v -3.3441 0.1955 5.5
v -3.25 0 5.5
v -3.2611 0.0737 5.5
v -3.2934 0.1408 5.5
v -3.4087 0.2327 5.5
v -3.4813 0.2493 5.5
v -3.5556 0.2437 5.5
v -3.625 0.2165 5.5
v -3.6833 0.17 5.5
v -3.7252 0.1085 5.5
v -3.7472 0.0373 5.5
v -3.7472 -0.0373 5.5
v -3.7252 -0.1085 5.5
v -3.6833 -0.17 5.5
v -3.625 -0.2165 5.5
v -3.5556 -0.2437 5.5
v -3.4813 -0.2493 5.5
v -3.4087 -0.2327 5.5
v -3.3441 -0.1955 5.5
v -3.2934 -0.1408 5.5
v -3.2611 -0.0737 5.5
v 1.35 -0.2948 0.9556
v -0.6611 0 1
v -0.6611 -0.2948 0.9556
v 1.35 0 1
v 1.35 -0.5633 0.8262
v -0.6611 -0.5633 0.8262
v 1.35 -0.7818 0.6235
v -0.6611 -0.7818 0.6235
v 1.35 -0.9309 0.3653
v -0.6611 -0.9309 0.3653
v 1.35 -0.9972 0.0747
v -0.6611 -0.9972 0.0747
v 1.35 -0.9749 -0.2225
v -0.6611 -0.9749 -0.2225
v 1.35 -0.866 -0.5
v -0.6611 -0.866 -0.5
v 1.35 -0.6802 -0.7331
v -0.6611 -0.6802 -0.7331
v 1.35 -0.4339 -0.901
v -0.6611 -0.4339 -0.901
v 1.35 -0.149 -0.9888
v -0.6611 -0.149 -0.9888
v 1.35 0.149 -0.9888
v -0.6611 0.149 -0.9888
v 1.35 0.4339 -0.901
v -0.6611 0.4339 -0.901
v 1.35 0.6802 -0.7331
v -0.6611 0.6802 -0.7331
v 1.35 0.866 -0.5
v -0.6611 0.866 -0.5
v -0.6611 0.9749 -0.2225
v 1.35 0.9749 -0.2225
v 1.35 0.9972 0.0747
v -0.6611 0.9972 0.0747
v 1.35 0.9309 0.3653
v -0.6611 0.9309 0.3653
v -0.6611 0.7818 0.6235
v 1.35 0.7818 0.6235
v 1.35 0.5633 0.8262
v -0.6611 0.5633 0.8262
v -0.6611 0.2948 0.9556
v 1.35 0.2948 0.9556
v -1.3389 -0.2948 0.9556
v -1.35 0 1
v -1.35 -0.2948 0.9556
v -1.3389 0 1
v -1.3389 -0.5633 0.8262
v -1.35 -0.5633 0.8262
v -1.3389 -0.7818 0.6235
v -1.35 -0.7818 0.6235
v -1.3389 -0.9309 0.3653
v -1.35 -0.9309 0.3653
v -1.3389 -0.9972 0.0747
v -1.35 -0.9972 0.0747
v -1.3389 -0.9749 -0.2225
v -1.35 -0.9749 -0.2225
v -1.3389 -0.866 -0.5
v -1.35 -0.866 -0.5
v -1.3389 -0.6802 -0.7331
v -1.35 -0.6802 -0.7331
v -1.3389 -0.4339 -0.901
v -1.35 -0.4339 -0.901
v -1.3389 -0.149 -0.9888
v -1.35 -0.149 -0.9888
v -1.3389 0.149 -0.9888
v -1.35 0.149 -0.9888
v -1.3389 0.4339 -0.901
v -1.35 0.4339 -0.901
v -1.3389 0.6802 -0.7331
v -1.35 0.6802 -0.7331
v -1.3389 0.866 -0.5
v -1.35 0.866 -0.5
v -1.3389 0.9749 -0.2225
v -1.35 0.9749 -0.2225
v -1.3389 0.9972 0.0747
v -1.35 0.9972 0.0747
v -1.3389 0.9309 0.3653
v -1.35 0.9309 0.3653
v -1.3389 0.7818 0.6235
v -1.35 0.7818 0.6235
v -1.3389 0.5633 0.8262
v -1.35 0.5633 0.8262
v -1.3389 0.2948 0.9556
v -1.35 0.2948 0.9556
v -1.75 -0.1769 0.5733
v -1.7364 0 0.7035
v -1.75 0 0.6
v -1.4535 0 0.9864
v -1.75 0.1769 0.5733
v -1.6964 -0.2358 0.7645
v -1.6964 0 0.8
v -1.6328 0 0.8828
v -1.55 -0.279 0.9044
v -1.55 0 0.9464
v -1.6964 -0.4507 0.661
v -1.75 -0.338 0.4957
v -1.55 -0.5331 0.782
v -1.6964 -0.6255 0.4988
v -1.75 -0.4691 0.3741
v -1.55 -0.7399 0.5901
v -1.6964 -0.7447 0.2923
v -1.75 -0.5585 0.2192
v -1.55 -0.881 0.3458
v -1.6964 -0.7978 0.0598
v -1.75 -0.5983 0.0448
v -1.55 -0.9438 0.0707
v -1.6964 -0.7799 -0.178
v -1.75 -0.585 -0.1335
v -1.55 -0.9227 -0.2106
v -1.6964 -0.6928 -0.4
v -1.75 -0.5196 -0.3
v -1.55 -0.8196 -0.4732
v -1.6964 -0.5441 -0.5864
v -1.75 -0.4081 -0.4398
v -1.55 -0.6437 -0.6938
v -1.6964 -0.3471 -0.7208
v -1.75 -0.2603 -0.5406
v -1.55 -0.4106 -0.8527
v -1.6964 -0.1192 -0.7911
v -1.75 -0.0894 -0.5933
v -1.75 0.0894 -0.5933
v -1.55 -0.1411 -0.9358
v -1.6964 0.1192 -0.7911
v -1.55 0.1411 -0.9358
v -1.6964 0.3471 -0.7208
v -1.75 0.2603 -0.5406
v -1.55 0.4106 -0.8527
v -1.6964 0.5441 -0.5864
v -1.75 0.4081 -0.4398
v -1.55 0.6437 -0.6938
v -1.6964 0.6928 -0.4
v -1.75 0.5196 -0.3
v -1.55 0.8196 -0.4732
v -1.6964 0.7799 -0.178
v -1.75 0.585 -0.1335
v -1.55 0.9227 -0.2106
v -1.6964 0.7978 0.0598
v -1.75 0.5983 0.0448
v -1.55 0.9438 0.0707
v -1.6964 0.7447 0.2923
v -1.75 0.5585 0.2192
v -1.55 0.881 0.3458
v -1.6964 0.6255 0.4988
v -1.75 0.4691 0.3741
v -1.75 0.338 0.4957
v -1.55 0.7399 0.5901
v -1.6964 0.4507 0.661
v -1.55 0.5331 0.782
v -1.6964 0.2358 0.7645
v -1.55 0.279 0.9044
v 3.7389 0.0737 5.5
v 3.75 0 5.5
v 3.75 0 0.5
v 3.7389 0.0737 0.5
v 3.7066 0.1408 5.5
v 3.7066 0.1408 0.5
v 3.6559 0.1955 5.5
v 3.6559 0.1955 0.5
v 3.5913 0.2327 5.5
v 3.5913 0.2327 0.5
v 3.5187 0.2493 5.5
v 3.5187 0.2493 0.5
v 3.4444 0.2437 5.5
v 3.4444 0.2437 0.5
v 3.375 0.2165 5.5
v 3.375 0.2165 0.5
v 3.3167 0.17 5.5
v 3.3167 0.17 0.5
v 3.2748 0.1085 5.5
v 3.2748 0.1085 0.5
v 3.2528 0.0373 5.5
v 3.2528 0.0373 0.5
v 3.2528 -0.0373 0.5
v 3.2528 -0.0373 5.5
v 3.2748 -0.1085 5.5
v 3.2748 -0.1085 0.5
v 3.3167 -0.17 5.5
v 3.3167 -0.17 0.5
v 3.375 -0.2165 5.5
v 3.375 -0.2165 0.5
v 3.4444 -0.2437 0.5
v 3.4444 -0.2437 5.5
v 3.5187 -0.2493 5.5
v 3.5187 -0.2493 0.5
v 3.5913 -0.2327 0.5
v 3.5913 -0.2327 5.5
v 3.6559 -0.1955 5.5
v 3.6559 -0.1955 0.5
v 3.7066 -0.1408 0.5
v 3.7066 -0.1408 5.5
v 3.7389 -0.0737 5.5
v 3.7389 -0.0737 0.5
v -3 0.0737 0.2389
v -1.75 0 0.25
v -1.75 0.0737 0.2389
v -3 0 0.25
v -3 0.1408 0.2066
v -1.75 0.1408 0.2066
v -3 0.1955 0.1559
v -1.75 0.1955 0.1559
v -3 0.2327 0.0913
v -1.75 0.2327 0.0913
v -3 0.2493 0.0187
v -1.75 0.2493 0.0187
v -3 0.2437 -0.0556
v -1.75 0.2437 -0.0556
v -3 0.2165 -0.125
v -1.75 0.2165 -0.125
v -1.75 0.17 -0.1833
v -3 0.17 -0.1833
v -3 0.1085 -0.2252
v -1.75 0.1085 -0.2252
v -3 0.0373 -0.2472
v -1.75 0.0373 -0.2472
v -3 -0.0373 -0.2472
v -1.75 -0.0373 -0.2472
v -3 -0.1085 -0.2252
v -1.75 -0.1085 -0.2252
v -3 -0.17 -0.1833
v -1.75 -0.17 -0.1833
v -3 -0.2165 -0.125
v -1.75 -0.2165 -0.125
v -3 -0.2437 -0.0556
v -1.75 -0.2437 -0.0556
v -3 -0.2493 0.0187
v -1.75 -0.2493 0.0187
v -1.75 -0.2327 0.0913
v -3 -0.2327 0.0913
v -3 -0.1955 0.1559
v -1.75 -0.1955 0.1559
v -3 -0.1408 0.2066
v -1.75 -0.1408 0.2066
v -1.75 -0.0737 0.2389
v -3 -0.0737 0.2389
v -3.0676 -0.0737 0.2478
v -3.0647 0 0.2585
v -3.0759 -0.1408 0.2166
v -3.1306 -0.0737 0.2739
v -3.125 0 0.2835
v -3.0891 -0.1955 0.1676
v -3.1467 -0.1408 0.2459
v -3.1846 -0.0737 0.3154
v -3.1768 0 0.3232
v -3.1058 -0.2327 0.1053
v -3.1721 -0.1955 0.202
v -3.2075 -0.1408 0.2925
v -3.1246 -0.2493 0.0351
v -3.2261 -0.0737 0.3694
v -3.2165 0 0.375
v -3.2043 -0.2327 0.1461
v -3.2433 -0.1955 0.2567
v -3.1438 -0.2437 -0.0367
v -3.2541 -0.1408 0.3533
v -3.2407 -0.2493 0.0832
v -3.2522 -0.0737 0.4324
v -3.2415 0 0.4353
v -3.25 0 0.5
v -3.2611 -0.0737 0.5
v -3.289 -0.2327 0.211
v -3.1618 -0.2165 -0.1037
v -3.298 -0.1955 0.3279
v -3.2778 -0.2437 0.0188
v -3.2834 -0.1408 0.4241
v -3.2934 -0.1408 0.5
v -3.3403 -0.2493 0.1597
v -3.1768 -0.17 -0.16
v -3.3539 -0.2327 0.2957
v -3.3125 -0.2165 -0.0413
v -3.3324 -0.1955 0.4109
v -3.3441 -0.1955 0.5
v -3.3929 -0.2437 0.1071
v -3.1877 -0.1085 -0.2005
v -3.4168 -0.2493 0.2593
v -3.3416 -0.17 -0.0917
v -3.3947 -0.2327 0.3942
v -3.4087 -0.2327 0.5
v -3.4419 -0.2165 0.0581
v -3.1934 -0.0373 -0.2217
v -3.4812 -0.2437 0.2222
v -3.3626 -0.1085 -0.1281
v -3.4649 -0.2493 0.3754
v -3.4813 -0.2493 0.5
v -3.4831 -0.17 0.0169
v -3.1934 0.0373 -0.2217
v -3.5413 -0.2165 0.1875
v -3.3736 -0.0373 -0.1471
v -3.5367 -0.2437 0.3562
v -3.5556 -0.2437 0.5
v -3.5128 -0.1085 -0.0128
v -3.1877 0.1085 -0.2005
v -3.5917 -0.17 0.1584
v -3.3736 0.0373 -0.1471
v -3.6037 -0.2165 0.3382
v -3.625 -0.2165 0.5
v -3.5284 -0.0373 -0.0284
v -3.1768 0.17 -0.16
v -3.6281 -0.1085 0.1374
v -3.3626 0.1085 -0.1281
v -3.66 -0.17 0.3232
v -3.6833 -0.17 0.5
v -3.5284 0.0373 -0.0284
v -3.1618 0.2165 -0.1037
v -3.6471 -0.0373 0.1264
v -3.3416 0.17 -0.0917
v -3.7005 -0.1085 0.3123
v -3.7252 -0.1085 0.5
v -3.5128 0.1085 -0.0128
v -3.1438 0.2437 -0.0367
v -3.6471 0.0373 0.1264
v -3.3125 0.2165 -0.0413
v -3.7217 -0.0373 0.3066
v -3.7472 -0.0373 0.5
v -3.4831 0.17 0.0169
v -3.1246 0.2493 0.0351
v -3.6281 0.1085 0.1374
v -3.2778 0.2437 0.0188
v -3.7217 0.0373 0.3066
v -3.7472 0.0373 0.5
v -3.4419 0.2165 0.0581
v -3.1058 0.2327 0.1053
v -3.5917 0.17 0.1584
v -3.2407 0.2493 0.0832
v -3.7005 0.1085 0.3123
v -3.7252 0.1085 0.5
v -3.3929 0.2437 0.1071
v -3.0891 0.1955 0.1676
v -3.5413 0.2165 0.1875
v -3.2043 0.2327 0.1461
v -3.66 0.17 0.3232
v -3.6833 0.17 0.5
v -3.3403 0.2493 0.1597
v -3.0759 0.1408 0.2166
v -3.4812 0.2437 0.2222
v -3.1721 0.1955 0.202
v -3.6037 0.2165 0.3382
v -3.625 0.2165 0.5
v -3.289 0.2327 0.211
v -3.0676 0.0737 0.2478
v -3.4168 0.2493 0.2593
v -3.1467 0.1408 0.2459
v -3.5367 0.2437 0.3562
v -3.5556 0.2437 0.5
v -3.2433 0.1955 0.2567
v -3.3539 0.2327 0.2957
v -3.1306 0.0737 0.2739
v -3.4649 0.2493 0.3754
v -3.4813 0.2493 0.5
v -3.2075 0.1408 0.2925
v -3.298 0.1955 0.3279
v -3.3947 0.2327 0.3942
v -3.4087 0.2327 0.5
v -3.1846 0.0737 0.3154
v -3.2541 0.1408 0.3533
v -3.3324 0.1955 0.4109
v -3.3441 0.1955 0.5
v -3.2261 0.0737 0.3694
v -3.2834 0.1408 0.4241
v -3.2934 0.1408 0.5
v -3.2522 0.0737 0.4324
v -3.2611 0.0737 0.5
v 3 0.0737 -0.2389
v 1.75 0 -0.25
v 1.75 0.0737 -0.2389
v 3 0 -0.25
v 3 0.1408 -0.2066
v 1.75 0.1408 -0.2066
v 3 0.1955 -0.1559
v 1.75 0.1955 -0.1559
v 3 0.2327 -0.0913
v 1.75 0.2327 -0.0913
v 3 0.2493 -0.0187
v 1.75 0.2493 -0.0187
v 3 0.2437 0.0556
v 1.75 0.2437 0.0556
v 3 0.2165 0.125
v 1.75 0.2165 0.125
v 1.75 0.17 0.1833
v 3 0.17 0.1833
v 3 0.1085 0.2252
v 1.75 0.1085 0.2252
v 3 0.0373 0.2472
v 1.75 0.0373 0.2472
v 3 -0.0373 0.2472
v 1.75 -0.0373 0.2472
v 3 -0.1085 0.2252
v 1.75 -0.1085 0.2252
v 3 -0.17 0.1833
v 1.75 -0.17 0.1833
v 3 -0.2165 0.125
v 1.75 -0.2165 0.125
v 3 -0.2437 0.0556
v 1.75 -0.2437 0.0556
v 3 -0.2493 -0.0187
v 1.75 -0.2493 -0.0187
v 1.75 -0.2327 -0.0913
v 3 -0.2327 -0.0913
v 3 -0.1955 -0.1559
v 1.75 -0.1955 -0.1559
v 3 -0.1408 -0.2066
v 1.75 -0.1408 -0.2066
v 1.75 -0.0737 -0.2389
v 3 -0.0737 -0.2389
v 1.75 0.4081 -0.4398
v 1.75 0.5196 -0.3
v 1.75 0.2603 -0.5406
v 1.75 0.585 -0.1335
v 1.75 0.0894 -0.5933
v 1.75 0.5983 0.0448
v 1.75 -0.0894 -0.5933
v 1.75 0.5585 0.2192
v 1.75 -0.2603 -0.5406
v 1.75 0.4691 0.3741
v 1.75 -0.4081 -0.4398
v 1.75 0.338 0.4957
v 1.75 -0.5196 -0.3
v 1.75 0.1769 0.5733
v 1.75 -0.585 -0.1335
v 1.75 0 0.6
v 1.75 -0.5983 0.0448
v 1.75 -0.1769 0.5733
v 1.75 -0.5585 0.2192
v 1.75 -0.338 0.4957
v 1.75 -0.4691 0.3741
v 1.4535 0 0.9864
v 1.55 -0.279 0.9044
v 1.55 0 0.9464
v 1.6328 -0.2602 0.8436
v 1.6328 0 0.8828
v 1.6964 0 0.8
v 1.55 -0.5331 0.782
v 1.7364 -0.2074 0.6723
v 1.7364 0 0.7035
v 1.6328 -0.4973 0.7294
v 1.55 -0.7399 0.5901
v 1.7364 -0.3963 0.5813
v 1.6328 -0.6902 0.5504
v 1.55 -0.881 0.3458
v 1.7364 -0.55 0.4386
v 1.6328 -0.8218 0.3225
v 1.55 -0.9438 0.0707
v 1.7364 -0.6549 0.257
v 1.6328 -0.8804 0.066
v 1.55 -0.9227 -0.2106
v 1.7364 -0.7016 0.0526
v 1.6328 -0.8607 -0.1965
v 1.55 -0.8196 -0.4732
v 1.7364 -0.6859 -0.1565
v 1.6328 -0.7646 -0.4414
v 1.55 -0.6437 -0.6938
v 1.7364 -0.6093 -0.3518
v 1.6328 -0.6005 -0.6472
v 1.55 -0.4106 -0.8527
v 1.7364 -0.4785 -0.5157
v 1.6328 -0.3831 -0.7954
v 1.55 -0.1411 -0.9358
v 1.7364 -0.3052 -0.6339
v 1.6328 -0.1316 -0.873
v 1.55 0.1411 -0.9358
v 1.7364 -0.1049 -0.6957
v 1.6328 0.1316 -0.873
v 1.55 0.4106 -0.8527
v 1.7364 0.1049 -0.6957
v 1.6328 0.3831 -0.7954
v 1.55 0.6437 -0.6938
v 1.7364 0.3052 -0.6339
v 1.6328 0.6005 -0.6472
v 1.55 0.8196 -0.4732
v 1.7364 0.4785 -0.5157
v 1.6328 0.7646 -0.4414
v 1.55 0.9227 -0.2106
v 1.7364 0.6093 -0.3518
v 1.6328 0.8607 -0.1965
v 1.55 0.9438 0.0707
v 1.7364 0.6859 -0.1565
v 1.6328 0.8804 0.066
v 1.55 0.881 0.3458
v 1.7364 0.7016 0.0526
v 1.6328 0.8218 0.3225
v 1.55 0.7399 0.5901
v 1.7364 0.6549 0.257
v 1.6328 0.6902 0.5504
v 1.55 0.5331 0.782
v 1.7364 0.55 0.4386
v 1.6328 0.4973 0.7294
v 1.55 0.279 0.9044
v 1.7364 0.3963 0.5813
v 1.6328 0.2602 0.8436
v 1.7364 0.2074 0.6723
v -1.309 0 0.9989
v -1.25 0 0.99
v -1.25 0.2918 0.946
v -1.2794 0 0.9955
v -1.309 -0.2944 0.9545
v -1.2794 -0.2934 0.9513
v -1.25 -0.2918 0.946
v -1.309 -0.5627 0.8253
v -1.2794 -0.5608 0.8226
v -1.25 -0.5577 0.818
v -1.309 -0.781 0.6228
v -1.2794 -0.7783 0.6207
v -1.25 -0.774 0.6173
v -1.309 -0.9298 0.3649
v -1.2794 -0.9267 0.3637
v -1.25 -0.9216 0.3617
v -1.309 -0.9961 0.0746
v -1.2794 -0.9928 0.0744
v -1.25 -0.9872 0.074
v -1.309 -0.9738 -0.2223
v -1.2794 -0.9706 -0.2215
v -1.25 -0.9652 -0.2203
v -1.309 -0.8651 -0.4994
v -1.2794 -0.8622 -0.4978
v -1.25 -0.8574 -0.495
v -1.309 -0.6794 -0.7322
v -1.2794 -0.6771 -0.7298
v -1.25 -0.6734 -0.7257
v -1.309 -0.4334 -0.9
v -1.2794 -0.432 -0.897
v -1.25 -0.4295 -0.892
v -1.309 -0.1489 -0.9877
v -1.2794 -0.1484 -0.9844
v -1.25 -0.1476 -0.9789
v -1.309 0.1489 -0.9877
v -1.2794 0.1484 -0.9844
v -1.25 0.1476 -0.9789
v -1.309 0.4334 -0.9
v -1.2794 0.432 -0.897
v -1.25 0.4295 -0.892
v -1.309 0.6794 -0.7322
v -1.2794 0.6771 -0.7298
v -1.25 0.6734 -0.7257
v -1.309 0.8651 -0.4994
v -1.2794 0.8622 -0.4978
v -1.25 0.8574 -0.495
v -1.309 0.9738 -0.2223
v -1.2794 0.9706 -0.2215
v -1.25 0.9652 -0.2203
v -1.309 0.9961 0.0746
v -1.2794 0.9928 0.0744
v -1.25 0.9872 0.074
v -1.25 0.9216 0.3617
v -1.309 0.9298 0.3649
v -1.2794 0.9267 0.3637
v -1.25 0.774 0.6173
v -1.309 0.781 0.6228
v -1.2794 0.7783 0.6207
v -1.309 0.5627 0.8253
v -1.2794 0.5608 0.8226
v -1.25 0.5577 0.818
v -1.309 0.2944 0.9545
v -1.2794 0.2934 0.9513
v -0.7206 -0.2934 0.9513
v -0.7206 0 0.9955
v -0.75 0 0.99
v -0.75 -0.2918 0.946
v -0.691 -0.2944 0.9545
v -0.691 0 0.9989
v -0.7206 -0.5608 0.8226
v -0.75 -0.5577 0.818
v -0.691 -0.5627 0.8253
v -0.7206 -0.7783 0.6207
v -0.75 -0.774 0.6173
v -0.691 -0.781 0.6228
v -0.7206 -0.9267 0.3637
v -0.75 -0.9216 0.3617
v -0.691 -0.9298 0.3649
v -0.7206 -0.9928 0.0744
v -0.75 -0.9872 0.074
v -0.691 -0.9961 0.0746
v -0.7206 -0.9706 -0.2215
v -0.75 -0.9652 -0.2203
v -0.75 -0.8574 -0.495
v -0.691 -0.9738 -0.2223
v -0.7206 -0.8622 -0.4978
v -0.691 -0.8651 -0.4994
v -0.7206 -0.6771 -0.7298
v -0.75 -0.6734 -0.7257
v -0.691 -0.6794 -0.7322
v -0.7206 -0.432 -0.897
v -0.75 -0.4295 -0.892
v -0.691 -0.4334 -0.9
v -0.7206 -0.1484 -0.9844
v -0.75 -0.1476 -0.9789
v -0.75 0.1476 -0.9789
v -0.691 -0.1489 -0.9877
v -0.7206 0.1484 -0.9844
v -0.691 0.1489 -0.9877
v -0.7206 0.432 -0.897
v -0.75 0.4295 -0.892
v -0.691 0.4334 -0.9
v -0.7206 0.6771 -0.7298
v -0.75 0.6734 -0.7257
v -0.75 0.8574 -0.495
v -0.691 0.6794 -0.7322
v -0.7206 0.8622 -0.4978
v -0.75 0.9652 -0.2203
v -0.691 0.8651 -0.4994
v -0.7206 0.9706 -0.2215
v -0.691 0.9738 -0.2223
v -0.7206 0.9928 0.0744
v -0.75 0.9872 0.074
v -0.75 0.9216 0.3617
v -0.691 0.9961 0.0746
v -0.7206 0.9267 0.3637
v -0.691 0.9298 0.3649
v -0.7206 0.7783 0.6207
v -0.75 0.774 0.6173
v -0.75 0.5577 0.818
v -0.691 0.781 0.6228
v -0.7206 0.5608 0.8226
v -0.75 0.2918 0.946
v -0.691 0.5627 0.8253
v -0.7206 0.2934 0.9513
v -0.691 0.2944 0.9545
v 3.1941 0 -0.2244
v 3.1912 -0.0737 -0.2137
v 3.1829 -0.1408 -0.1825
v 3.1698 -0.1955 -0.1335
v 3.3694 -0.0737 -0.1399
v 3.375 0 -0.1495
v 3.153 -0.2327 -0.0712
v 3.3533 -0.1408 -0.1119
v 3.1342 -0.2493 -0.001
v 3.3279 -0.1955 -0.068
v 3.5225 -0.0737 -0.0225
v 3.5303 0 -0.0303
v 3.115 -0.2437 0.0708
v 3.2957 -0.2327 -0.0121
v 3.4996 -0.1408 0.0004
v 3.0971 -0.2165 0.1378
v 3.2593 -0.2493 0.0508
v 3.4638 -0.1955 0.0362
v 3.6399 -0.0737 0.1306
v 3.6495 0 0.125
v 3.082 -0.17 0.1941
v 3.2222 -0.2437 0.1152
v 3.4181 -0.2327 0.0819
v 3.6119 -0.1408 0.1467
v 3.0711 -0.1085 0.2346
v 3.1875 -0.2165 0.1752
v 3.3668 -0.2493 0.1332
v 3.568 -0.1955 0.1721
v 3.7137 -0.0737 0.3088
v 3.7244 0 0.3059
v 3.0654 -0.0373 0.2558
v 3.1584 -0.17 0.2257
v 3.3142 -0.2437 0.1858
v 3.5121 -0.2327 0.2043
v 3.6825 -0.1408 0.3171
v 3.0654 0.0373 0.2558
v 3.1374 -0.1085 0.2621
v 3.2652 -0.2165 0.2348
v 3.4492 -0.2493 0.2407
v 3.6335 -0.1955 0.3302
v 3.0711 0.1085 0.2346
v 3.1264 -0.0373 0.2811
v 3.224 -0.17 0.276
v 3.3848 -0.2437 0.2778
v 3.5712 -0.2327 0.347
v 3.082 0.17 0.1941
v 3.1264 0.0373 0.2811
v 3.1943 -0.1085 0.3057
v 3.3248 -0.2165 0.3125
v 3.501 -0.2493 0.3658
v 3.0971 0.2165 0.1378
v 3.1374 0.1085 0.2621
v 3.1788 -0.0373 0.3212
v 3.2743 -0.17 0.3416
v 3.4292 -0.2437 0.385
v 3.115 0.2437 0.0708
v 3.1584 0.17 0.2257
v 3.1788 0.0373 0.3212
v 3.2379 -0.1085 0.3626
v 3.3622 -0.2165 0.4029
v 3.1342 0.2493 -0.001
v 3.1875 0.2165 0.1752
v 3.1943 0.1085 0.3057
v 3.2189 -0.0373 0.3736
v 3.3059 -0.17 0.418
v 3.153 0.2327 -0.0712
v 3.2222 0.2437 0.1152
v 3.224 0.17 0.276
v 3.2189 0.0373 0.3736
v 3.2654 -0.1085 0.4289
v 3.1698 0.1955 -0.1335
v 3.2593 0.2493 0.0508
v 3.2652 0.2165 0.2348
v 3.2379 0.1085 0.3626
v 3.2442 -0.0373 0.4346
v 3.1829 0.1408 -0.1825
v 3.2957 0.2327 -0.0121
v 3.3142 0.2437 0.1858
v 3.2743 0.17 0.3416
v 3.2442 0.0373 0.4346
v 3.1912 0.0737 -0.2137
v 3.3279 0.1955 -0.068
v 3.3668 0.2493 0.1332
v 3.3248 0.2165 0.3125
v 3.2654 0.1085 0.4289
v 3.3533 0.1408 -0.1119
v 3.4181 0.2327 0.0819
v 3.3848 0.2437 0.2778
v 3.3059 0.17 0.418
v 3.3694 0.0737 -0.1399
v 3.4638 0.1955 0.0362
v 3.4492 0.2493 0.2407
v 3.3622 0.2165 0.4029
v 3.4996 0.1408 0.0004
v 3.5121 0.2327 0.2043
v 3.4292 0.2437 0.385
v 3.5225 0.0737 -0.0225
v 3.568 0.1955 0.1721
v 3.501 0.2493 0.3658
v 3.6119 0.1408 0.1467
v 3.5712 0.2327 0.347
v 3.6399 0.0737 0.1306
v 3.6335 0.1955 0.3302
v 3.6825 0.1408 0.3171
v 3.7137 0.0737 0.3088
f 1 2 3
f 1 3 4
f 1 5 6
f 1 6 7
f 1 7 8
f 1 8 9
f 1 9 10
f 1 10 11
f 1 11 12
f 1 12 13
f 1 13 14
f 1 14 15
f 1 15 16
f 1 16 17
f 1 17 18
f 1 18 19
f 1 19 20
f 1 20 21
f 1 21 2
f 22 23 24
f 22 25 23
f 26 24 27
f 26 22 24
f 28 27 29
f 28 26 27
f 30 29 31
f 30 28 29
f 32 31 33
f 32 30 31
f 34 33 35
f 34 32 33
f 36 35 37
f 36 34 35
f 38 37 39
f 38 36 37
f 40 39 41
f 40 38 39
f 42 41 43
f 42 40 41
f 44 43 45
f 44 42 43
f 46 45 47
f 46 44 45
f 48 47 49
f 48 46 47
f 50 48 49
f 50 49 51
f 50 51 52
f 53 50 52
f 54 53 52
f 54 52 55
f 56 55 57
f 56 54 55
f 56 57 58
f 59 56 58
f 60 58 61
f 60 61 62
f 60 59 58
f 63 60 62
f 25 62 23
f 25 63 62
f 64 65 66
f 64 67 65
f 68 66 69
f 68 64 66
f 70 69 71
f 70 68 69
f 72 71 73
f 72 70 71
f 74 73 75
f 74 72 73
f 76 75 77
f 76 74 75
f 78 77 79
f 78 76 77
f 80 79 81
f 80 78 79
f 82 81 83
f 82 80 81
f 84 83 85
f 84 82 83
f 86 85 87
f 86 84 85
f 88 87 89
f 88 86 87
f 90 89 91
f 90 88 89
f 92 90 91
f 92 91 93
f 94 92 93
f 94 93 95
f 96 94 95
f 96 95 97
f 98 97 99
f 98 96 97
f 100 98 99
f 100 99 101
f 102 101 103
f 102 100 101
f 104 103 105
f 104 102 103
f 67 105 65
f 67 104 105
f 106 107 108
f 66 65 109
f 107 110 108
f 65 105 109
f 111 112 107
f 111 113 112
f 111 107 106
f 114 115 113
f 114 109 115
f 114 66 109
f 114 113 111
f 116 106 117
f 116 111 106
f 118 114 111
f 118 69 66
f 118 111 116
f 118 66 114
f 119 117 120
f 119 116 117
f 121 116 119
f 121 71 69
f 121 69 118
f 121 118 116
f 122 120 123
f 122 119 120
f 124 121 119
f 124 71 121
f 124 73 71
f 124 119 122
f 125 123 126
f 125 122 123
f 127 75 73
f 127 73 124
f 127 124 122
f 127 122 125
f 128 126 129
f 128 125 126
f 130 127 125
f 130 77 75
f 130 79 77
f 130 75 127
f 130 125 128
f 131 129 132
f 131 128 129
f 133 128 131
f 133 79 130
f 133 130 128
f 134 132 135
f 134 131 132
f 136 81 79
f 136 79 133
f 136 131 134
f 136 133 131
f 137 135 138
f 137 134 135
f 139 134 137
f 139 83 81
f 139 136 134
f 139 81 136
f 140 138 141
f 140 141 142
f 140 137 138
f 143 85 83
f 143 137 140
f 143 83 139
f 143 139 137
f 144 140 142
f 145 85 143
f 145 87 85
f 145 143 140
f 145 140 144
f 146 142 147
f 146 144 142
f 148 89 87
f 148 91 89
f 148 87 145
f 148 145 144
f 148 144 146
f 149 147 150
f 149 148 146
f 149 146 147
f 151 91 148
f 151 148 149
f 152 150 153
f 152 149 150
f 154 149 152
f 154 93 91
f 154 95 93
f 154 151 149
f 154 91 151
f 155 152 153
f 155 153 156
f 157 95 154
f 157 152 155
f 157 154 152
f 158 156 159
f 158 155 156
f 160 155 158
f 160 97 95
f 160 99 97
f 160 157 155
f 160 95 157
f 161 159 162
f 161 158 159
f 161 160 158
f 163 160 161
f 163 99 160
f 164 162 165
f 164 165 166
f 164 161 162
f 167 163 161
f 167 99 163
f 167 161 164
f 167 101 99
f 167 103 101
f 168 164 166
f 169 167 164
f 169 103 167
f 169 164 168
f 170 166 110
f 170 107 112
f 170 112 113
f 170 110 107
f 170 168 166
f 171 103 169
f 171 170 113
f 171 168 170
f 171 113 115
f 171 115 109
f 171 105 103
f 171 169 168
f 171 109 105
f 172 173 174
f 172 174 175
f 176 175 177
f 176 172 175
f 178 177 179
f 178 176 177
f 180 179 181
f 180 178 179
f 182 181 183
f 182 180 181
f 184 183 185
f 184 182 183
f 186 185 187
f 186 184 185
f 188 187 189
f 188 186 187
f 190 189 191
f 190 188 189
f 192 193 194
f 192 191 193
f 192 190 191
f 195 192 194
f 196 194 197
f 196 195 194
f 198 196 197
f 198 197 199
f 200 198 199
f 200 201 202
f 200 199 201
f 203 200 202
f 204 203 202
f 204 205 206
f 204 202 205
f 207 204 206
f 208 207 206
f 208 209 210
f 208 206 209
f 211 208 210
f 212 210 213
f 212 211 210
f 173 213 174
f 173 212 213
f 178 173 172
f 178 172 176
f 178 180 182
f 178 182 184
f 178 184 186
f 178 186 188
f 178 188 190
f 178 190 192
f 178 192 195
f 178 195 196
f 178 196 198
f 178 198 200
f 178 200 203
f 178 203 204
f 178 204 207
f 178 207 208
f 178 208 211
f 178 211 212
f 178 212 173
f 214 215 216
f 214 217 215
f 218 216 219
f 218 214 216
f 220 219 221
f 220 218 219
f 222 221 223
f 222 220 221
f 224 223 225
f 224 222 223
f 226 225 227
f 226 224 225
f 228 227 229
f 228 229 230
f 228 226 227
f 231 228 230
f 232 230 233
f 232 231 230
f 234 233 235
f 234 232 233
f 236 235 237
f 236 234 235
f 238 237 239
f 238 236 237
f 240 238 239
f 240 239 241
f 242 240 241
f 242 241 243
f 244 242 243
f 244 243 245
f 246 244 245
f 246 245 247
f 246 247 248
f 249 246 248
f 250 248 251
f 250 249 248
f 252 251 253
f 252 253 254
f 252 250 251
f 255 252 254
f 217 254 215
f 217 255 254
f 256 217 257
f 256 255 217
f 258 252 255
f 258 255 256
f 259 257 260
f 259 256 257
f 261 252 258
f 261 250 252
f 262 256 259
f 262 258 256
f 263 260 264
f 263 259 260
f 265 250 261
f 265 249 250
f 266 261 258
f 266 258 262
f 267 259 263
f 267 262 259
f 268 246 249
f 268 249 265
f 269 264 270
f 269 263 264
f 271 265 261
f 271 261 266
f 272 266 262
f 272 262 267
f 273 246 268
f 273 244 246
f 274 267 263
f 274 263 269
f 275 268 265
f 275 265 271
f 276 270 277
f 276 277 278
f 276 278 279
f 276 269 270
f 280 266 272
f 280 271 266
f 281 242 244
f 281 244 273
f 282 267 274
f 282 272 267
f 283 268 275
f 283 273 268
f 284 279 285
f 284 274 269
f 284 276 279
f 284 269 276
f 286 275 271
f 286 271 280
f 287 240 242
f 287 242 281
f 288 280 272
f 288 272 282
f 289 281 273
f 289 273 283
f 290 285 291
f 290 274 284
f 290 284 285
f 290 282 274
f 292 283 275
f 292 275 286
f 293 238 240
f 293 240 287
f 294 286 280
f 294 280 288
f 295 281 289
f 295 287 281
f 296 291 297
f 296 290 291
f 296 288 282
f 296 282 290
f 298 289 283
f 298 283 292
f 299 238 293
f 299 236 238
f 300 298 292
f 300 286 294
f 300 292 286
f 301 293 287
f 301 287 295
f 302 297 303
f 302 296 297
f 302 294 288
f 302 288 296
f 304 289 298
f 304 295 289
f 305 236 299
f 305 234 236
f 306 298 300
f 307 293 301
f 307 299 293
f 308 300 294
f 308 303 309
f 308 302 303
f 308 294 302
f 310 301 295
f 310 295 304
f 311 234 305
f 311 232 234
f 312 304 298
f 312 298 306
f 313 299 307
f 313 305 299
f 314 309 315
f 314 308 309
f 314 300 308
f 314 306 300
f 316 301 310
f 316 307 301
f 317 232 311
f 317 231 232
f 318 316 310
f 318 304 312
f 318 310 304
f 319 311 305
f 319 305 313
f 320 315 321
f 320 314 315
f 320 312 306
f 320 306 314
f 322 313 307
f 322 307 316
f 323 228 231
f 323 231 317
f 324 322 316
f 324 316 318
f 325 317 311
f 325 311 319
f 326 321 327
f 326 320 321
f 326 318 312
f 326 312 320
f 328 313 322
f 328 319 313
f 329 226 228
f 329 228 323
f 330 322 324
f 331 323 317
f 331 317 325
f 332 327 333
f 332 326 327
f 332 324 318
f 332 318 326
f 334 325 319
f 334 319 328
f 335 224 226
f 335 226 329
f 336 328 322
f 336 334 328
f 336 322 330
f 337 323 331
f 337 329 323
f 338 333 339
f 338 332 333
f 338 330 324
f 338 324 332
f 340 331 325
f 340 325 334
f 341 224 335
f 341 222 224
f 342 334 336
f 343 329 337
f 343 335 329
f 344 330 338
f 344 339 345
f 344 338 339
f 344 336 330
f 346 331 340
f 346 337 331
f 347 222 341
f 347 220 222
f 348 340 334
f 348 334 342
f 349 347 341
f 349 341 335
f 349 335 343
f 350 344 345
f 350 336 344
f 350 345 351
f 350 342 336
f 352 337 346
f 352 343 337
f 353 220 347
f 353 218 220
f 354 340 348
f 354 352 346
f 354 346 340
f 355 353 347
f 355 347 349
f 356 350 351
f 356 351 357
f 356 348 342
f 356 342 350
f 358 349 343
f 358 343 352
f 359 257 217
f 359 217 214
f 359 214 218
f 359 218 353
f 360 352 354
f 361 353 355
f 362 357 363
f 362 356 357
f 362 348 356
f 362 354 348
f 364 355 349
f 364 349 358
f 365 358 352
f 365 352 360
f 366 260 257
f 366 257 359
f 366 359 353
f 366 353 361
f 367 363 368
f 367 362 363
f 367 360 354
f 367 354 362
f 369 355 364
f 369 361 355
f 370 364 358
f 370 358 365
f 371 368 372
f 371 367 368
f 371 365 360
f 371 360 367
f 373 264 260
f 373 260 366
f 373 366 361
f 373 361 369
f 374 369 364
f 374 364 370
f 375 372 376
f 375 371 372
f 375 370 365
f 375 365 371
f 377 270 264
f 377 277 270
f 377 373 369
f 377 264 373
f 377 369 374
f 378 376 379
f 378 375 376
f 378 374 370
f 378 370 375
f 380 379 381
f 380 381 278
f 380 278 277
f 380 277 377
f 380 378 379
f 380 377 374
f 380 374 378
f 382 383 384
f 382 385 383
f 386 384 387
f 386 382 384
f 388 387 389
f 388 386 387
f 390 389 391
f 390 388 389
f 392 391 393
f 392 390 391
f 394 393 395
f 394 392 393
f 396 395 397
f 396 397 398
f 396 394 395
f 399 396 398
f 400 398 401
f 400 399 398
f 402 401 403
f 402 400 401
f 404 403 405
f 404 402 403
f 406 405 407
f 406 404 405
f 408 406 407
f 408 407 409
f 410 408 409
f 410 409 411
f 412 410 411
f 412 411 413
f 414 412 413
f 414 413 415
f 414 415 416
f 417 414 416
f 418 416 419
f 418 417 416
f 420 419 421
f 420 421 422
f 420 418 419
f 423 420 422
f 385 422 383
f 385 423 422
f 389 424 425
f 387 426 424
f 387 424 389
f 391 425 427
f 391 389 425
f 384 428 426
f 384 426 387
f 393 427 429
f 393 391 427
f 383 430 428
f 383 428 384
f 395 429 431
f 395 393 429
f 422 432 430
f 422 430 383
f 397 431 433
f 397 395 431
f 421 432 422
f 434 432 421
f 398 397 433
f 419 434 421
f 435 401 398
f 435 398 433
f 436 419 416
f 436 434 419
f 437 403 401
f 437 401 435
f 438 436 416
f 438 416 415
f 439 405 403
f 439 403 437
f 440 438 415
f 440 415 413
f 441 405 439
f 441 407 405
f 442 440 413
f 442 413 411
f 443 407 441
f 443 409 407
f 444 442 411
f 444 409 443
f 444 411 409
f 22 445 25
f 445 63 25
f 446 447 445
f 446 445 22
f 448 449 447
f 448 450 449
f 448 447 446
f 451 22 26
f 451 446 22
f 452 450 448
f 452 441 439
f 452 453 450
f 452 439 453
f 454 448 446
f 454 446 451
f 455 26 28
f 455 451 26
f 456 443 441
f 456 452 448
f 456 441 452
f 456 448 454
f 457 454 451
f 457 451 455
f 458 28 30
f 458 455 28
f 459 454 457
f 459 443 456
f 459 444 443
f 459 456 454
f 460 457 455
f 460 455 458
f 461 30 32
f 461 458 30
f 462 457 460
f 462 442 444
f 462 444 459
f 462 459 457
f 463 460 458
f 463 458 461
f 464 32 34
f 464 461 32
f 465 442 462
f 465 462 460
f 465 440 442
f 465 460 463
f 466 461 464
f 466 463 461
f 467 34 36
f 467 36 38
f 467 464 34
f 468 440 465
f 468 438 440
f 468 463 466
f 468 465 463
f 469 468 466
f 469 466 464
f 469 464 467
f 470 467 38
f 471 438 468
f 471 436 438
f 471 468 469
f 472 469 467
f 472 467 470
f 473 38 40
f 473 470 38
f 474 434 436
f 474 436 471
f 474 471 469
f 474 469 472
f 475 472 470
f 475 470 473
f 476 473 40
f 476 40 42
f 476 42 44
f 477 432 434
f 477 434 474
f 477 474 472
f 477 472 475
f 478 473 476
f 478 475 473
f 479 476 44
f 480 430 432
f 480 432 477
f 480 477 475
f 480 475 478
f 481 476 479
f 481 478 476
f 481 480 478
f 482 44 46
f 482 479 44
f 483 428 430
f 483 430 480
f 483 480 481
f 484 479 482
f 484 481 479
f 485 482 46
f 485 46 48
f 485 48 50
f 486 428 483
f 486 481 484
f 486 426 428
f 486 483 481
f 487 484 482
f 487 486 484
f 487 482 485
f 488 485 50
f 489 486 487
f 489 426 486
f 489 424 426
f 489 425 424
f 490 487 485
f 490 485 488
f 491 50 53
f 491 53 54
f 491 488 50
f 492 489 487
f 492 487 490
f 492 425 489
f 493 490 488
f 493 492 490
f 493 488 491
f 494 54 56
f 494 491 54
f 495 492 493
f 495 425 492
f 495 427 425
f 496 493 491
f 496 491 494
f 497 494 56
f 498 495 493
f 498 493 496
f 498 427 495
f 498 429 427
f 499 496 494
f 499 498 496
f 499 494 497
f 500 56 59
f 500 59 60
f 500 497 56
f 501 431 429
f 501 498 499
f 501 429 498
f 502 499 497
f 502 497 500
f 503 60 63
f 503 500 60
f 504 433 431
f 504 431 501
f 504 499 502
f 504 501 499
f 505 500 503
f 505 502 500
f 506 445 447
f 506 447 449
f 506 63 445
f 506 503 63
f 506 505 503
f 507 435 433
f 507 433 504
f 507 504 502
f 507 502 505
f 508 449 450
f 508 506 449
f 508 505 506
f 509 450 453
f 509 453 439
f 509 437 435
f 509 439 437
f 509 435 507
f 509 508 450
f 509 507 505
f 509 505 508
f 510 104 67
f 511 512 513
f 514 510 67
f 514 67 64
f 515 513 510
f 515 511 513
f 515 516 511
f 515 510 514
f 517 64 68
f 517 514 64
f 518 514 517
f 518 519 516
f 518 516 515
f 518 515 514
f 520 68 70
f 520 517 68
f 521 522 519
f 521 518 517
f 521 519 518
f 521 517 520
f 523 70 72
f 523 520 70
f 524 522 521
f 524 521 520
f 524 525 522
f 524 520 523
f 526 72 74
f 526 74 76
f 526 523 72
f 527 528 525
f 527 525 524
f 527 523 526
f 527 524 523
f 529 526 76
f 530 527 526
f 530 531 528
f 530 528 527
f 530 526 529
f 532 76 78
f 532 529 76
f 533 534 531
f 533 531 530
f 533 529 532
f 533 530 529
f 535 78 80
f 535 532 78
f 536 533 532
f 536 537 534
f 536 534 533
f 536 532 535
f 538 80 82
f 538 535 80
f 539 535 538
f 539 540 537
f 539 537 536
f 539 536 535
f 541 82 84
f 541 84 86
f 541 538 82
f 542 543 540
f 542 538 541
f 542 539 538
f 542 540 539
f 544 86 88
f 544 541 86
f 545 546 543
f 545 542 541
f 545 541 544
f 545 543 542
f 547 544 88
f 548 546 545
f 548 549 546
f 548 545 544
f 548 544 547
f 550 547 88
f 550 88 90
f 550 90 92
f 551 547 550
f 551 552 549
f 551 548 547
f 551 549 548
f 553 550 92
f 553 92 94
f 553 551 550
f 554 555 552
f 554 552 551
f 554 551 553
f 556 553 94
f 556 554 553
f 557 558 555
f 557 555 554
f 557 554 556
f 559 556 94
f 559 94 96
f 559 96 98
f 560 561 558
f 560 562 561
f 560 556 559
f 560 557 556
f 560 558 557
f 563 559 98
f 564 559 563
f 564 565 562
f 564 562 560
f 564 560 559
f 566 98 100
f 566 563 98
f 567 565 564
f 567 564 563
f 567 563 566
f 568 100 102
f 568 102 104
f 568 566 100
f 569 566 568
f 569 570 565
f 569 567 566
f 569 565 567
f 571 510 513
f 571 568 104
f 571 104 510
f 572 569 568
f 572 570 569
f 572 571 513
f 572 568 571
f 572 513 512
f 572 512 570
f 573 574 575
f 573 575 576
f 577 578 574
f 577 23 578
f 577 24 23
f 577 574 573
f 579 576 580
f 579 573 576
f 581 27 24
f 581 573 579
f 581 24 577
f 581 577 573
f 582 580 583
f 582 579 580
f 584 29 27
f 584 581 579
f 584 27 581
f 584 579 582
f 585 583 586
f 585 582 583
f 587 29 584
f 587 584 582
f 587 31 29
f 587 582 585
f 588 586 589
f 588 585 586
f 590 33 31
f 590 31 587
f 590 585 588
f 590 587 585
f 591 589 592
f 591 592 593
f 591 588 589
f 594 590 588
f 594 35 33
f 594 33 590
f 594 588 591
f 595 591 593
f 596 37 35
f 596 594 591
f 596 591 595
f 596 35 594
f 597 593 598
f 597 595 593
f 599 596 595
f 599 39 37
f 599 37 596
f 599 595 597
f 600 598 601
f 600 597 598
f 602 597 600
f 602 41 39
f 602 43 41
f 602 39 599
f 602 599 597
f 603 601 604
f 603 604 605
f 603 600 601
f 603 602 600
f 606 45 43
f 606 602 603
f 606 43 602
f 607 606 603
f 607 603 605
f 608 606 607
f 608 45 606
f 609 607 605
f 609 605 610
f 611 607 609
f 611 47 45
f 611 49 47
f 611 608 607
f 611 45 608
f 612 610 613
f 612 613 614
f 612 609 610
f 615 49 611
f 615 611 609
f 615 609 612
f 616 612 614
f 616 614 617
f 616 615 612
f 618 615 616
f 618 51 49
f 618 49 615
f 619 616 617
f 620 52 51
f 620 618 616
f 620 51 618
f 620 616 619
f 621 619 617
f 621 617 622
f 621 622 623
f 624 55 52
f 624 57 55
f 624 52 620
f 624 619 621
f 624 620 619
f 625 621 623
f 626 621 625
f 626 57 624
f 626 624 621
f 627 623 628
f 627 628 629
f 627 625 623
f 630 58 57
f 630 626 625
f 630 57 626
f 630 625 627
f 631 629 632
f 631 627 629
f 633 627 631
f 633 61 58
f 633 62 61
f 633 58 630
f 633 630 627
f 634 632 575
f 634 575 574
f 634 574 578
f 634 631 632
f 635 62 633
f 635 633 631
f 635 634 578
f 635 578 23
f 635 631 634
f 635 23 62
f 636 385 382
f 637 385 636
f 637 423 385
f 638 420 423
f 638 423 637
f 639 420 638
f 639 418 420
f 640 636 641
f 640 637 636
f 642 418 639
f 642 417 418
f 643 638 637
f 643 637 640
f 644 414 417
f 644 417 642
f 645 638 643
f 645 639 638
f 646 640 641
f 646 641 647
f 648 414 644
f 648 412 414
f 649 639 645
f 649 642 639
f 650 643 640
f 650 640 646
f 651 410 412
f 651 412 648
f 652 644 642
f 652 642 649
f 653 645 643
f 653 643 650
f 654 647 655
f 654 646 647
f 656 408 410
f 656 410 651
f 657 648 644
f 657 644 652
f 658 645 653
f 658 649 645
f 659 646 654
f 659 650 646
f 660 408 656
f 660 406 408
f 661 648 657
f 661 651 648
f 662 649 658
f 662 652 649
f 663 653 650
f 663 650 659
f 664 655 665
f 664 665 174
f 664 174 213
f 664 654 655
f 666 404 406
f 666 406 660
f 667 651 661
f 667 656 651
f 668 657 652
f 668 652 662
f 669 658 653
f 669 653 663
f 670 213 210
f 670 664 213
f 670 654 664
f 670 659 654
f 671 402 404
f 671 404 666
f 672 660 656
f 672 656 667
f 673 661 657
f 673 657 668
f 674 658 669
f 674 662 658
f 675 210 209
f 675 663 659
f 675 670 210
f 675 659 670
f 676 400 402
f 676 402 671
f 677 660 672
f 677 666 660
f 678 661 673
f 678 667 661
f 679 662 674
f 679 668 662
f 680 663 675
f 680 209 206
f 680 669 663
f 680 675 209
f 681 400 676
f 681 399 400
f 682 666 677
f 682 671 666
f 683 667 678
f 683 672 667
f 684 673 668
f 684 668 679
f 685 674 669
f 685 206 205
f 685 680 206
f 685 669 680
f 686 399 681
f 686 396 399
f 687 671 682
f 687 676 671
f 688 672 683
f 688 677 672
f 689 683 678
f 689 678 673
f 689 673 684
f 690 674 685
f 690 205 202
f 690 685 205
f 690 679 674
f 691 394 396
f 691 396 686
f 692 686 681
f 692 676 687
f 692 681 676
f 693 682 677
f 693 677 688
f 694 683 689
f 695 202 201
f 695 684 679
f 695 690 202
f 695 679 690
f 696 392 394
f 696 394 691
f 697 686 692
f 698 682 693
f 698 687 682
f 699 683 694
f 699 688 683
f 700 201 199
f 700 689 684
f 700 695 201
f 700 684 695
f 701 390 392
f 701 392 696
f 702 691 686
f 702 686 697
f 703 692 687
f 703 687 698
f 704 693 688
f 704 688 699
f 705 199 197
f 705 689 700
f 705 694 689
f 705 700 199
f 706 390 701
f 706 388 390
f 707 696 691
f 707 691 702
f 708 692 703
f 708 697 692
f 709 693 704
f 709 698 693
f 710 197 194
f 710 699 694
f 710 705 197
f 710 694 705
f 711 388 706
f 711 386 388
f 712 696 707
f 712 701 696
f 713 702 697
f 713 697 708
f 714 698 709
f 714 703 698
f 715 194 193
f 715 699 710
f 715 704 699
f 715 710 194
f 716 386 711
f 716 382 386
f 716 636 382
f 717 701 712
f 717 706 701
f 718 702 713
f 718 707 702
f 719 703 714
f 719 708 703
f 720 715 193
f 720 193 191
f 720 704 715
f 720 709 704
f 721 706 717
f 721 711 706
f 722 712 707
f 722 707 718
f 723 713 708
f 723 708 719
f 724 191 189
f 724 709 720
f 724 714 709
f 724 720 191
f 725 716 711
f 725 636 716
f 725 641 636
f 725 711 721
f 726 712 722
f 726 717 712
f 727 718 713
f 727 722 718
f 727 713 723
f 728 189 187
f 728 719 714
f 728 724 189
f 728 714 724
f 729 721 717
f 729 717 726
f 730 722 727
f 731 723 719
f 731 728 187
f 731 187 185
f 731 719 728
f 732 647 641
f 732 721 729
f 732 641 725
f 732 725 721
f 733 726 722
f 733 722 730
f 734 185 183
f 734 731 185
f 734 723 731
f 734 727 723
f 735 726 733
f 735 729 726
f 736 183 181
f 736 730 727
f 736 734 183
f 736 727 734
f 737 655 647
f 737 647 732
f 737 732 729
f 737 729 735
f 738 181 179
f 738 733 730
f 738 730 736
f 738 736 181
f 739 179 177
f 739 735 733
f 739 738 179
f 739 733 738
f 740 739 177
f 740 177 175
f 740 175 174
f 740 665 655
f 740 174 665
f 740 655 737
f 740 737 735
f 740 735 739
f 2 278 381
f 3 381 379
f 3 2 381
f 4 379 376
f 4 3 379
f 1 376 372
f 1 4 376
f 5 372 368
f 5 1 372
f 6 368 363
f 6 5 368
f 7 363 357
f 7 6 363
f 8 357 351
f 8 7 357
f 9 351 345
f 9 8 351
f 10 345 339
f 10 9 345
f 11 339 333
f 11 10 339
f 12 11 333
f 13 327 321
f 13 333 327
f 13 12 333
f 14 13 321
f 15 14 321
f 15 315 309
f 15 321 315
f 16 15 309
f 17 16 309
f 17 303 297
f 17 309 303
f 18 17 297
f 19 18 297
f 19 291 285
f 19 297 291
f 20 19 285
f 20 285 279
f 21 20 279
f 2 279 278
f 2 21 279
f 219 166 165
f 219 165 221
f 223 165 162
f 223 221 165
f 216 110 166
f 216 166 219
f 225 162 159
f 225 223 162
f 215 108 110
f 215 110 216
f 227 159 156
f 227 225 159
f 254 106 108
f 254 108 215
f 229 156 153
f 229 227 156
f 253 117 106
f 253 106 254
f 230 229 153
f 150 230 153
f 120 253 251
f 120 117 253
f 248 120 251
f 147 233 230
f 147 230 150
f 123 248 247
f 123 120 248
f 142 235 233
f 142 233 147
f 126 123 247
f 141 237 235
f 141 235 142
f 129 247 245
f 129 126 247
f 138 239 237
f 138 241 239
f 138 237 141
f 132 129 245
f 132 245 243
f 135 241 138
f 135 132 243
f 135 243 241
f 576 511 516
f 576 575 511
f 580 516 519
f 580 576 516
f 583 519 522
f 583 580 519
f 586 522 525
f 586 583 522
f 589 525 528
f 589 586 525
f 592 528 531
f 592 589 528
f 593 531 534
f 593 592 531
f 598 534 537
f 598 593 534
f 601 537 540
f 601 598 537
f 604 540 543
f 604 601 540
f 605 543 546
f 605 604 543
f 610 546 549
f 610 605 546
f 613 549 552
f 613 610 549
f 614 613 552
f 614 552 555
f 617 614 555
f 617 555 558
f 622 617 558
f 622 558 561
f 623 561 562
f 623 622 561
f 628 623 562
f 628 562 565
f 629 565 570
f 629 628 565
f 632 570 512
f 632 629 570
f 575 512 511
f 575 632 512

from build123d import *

# Parameters (mm, degrees)
IZIM5_R   = 0.25
IZIM7_R   = 0.25
RADYUS1_R = 0.4
RADYUS2_R = 0.4


with BuildPart() as part:
    # Çizim3 → Döndür2 (revolve)
    with BuildSketch(Plane(origin=(0, 0, 0), x_dir=(1, 0, 0), z_dir=(0, 1, 0))):
        Polygon((-0.75, -1), (1.75, -1), (1.75, 0), (-1.75, 0), (-1.75, -1), (-1.25, -1), (-1.25, -0.99), (-0.75, -0.99), align=None)
    revolve(axis=Axis((-1.75, 0, 0), (1, 0, 0)))

    # Süpür1: sweep along a path in Çizim4
    with BuildLine(Plane(origin=(0, 0, 0), x_dir=(1, 0, 0), z_dir=(0, 1, 0))) as s_p_r1_path:
        Line((-1.578677494, 0), (-3, 0))
        ThreePointArc((-3, 0), (-3.353553391, -0.146446609), (-3.5, -0.5))
        Line((-3.5, -0.5), (-3.5, -5.5))
    # Çizim5 → Süpür1 (sweep)
    with BuildSketch(Plane.ZY.offset(1.578677494)):
        Circle(IZIM5_R)
    sweep(path=s_p_r1_path.line)

    # Süpür2: sweep along a path in Çizim6
    with BuildLine(Plane(origin=(0, 0, 0), x_dir=(1, 0, 0), z_dir=(0, 1, 0))) as s_p_r2_path:
        Line((1.519396703, 0), (3, 0))
        ThreePointArc((3, 0), (3.353553391, -0.146446609), (3.5, -0.5))
        Line((3.5, -0.5), (3.5, -5.5))
    # Çizim7 → Süpür2 (sweep)
    with BuildSketch(Plane(origin=(1.519396703, 0, 0), x_dir=(0, 0, -1), z_dir=(1, 0, 0))):
        Circle(IZIM7_R)
    sweep(path=s_p_r2_path.line)

    # Radyus1
    # the kernel refuses this fillet: 0.4 mm, written as the material it takes off along each edge
    with BuildSketch(Plane(origin=(1.75, 0, 0), x_dir=(0, 0, 1), z_dir=(0, 1, 0))) as radyus1_piece_1:
        with BuildLine():
            CenterArc((1 - RADYUS1_R, -RADYUS1_R), RADYUS1_R, 0, 90)
            Line((1 - RADYUS1_R, 0), (1 - RADYUS1_R, RADYUS1_R * 0.02))
            Line((1 - RADYUS1_R, RADYUS1_R * 0.02), (1 + RADYUS1_R * 0.02, RADYUS1_R * 0.02))
            Line((1 + RADYUS1_R * 0.02, RADYUS1_R * 0.02), (1 + RADYUS1_R * 0.02, -RADYUS1_R))
            Line((1 + RADYUS1_R * 0.02, -RADYUS1_R), (1, -RADYUS1_R))
        make_face()
    revolve(axis=Axis((1.75, 0, 0), (1, 0, 0)), mode=Mode.SUBTRACT)
    with BuildSketch(Plane(origin=(-0.75, 0, 0), x_dir=(0, 0, 1), z_dir=(0, 1, 0))) as radyus1_piece_2:
        with BuildLine():
            CenterArc((0.6, 0.088881944), RADYUS1_R, 347.161431859, 12.838568141)
            Line((0.99, 0), (0.9978, -0.001777639))
            ThreePointArc((0.9978, -0.001777639), (0.995, -0.008), (1, -0.008))
            Line((1, -0.008), (1.008, 0))
            Line((1.008, 0), (1.008, 0.088881944))
            Line((1.008, 0.088881944), (1, 0.088881944))
        make_face()
    revolve(axis=Axis((-0.75, 0, 0), (1, 0, 0)), mode=Mode.SUBTRACT)

    # Radyus2
    # the kernel refuses this fillet: 0.4 mm, written as the material it takes off along each edge
    with BuildSketch(Plane(origin=(-1.25, 0, 0), x_dir=(0, 0, 1), z_dir=(0, 1, 0))) as radyus2_piece_1:
        with BuildLine():
            CenterArc((0.6, -0.088881944), RADYUS2_R, 0, 12.838568141)
            Line((1, -0.088881944), (1.008, -0.088881944))
            Line((1.008, -0.088881944), (1.008, 0))
            Line((1.008, 0), (1, 0.008))
            ThreePointArc((1, 0.008), (0.995, 0.008), (0.9978, 0.001777639))
            Line((0.9978, 0.001777639), (0.99, 0))
        make_face()
    revolve(axis=Axis((-1.25, 0, 0), (1, 0, 0)), mode=Mode.SUBTRACT)
    with BuildSketch(Plane(origin=(-1.75, 0, 0), x_dir=(0, 0, 1), z_dir=(0, 1, 0))) as radyus2_piece_2:
        with BuildLine():
            CenterArc((1 - RADYUS2_R, RADYUS2_R), RADYUS2_R, 270, 90)
            Line((1 - RADYUS2_R, 0), (1 - RADYUS2_R, -RADYUS2_R * 0.02))
            Line((1 - RADYUS2_R, -RADYUS2_R * 0.02), (1 + RADYUS2_R * 0.02, -RADYUS2_R * 0.02))
            Line((1 + RADYUS2_R * 0.02, -RADYUS2_R * 0.02), (1 + RADYUS2_R * 0.02, RADYUS2_R))
            Line((1 + RADYUS2_R * 0.02, RADYUS2_R), (1, RADYUS2_R))
        make_face()
    revolve(axis=Axis((-1.75, 0, 0), (1, 0, 0)), mode=Mode.SUBTRACT)


solid = part.part
